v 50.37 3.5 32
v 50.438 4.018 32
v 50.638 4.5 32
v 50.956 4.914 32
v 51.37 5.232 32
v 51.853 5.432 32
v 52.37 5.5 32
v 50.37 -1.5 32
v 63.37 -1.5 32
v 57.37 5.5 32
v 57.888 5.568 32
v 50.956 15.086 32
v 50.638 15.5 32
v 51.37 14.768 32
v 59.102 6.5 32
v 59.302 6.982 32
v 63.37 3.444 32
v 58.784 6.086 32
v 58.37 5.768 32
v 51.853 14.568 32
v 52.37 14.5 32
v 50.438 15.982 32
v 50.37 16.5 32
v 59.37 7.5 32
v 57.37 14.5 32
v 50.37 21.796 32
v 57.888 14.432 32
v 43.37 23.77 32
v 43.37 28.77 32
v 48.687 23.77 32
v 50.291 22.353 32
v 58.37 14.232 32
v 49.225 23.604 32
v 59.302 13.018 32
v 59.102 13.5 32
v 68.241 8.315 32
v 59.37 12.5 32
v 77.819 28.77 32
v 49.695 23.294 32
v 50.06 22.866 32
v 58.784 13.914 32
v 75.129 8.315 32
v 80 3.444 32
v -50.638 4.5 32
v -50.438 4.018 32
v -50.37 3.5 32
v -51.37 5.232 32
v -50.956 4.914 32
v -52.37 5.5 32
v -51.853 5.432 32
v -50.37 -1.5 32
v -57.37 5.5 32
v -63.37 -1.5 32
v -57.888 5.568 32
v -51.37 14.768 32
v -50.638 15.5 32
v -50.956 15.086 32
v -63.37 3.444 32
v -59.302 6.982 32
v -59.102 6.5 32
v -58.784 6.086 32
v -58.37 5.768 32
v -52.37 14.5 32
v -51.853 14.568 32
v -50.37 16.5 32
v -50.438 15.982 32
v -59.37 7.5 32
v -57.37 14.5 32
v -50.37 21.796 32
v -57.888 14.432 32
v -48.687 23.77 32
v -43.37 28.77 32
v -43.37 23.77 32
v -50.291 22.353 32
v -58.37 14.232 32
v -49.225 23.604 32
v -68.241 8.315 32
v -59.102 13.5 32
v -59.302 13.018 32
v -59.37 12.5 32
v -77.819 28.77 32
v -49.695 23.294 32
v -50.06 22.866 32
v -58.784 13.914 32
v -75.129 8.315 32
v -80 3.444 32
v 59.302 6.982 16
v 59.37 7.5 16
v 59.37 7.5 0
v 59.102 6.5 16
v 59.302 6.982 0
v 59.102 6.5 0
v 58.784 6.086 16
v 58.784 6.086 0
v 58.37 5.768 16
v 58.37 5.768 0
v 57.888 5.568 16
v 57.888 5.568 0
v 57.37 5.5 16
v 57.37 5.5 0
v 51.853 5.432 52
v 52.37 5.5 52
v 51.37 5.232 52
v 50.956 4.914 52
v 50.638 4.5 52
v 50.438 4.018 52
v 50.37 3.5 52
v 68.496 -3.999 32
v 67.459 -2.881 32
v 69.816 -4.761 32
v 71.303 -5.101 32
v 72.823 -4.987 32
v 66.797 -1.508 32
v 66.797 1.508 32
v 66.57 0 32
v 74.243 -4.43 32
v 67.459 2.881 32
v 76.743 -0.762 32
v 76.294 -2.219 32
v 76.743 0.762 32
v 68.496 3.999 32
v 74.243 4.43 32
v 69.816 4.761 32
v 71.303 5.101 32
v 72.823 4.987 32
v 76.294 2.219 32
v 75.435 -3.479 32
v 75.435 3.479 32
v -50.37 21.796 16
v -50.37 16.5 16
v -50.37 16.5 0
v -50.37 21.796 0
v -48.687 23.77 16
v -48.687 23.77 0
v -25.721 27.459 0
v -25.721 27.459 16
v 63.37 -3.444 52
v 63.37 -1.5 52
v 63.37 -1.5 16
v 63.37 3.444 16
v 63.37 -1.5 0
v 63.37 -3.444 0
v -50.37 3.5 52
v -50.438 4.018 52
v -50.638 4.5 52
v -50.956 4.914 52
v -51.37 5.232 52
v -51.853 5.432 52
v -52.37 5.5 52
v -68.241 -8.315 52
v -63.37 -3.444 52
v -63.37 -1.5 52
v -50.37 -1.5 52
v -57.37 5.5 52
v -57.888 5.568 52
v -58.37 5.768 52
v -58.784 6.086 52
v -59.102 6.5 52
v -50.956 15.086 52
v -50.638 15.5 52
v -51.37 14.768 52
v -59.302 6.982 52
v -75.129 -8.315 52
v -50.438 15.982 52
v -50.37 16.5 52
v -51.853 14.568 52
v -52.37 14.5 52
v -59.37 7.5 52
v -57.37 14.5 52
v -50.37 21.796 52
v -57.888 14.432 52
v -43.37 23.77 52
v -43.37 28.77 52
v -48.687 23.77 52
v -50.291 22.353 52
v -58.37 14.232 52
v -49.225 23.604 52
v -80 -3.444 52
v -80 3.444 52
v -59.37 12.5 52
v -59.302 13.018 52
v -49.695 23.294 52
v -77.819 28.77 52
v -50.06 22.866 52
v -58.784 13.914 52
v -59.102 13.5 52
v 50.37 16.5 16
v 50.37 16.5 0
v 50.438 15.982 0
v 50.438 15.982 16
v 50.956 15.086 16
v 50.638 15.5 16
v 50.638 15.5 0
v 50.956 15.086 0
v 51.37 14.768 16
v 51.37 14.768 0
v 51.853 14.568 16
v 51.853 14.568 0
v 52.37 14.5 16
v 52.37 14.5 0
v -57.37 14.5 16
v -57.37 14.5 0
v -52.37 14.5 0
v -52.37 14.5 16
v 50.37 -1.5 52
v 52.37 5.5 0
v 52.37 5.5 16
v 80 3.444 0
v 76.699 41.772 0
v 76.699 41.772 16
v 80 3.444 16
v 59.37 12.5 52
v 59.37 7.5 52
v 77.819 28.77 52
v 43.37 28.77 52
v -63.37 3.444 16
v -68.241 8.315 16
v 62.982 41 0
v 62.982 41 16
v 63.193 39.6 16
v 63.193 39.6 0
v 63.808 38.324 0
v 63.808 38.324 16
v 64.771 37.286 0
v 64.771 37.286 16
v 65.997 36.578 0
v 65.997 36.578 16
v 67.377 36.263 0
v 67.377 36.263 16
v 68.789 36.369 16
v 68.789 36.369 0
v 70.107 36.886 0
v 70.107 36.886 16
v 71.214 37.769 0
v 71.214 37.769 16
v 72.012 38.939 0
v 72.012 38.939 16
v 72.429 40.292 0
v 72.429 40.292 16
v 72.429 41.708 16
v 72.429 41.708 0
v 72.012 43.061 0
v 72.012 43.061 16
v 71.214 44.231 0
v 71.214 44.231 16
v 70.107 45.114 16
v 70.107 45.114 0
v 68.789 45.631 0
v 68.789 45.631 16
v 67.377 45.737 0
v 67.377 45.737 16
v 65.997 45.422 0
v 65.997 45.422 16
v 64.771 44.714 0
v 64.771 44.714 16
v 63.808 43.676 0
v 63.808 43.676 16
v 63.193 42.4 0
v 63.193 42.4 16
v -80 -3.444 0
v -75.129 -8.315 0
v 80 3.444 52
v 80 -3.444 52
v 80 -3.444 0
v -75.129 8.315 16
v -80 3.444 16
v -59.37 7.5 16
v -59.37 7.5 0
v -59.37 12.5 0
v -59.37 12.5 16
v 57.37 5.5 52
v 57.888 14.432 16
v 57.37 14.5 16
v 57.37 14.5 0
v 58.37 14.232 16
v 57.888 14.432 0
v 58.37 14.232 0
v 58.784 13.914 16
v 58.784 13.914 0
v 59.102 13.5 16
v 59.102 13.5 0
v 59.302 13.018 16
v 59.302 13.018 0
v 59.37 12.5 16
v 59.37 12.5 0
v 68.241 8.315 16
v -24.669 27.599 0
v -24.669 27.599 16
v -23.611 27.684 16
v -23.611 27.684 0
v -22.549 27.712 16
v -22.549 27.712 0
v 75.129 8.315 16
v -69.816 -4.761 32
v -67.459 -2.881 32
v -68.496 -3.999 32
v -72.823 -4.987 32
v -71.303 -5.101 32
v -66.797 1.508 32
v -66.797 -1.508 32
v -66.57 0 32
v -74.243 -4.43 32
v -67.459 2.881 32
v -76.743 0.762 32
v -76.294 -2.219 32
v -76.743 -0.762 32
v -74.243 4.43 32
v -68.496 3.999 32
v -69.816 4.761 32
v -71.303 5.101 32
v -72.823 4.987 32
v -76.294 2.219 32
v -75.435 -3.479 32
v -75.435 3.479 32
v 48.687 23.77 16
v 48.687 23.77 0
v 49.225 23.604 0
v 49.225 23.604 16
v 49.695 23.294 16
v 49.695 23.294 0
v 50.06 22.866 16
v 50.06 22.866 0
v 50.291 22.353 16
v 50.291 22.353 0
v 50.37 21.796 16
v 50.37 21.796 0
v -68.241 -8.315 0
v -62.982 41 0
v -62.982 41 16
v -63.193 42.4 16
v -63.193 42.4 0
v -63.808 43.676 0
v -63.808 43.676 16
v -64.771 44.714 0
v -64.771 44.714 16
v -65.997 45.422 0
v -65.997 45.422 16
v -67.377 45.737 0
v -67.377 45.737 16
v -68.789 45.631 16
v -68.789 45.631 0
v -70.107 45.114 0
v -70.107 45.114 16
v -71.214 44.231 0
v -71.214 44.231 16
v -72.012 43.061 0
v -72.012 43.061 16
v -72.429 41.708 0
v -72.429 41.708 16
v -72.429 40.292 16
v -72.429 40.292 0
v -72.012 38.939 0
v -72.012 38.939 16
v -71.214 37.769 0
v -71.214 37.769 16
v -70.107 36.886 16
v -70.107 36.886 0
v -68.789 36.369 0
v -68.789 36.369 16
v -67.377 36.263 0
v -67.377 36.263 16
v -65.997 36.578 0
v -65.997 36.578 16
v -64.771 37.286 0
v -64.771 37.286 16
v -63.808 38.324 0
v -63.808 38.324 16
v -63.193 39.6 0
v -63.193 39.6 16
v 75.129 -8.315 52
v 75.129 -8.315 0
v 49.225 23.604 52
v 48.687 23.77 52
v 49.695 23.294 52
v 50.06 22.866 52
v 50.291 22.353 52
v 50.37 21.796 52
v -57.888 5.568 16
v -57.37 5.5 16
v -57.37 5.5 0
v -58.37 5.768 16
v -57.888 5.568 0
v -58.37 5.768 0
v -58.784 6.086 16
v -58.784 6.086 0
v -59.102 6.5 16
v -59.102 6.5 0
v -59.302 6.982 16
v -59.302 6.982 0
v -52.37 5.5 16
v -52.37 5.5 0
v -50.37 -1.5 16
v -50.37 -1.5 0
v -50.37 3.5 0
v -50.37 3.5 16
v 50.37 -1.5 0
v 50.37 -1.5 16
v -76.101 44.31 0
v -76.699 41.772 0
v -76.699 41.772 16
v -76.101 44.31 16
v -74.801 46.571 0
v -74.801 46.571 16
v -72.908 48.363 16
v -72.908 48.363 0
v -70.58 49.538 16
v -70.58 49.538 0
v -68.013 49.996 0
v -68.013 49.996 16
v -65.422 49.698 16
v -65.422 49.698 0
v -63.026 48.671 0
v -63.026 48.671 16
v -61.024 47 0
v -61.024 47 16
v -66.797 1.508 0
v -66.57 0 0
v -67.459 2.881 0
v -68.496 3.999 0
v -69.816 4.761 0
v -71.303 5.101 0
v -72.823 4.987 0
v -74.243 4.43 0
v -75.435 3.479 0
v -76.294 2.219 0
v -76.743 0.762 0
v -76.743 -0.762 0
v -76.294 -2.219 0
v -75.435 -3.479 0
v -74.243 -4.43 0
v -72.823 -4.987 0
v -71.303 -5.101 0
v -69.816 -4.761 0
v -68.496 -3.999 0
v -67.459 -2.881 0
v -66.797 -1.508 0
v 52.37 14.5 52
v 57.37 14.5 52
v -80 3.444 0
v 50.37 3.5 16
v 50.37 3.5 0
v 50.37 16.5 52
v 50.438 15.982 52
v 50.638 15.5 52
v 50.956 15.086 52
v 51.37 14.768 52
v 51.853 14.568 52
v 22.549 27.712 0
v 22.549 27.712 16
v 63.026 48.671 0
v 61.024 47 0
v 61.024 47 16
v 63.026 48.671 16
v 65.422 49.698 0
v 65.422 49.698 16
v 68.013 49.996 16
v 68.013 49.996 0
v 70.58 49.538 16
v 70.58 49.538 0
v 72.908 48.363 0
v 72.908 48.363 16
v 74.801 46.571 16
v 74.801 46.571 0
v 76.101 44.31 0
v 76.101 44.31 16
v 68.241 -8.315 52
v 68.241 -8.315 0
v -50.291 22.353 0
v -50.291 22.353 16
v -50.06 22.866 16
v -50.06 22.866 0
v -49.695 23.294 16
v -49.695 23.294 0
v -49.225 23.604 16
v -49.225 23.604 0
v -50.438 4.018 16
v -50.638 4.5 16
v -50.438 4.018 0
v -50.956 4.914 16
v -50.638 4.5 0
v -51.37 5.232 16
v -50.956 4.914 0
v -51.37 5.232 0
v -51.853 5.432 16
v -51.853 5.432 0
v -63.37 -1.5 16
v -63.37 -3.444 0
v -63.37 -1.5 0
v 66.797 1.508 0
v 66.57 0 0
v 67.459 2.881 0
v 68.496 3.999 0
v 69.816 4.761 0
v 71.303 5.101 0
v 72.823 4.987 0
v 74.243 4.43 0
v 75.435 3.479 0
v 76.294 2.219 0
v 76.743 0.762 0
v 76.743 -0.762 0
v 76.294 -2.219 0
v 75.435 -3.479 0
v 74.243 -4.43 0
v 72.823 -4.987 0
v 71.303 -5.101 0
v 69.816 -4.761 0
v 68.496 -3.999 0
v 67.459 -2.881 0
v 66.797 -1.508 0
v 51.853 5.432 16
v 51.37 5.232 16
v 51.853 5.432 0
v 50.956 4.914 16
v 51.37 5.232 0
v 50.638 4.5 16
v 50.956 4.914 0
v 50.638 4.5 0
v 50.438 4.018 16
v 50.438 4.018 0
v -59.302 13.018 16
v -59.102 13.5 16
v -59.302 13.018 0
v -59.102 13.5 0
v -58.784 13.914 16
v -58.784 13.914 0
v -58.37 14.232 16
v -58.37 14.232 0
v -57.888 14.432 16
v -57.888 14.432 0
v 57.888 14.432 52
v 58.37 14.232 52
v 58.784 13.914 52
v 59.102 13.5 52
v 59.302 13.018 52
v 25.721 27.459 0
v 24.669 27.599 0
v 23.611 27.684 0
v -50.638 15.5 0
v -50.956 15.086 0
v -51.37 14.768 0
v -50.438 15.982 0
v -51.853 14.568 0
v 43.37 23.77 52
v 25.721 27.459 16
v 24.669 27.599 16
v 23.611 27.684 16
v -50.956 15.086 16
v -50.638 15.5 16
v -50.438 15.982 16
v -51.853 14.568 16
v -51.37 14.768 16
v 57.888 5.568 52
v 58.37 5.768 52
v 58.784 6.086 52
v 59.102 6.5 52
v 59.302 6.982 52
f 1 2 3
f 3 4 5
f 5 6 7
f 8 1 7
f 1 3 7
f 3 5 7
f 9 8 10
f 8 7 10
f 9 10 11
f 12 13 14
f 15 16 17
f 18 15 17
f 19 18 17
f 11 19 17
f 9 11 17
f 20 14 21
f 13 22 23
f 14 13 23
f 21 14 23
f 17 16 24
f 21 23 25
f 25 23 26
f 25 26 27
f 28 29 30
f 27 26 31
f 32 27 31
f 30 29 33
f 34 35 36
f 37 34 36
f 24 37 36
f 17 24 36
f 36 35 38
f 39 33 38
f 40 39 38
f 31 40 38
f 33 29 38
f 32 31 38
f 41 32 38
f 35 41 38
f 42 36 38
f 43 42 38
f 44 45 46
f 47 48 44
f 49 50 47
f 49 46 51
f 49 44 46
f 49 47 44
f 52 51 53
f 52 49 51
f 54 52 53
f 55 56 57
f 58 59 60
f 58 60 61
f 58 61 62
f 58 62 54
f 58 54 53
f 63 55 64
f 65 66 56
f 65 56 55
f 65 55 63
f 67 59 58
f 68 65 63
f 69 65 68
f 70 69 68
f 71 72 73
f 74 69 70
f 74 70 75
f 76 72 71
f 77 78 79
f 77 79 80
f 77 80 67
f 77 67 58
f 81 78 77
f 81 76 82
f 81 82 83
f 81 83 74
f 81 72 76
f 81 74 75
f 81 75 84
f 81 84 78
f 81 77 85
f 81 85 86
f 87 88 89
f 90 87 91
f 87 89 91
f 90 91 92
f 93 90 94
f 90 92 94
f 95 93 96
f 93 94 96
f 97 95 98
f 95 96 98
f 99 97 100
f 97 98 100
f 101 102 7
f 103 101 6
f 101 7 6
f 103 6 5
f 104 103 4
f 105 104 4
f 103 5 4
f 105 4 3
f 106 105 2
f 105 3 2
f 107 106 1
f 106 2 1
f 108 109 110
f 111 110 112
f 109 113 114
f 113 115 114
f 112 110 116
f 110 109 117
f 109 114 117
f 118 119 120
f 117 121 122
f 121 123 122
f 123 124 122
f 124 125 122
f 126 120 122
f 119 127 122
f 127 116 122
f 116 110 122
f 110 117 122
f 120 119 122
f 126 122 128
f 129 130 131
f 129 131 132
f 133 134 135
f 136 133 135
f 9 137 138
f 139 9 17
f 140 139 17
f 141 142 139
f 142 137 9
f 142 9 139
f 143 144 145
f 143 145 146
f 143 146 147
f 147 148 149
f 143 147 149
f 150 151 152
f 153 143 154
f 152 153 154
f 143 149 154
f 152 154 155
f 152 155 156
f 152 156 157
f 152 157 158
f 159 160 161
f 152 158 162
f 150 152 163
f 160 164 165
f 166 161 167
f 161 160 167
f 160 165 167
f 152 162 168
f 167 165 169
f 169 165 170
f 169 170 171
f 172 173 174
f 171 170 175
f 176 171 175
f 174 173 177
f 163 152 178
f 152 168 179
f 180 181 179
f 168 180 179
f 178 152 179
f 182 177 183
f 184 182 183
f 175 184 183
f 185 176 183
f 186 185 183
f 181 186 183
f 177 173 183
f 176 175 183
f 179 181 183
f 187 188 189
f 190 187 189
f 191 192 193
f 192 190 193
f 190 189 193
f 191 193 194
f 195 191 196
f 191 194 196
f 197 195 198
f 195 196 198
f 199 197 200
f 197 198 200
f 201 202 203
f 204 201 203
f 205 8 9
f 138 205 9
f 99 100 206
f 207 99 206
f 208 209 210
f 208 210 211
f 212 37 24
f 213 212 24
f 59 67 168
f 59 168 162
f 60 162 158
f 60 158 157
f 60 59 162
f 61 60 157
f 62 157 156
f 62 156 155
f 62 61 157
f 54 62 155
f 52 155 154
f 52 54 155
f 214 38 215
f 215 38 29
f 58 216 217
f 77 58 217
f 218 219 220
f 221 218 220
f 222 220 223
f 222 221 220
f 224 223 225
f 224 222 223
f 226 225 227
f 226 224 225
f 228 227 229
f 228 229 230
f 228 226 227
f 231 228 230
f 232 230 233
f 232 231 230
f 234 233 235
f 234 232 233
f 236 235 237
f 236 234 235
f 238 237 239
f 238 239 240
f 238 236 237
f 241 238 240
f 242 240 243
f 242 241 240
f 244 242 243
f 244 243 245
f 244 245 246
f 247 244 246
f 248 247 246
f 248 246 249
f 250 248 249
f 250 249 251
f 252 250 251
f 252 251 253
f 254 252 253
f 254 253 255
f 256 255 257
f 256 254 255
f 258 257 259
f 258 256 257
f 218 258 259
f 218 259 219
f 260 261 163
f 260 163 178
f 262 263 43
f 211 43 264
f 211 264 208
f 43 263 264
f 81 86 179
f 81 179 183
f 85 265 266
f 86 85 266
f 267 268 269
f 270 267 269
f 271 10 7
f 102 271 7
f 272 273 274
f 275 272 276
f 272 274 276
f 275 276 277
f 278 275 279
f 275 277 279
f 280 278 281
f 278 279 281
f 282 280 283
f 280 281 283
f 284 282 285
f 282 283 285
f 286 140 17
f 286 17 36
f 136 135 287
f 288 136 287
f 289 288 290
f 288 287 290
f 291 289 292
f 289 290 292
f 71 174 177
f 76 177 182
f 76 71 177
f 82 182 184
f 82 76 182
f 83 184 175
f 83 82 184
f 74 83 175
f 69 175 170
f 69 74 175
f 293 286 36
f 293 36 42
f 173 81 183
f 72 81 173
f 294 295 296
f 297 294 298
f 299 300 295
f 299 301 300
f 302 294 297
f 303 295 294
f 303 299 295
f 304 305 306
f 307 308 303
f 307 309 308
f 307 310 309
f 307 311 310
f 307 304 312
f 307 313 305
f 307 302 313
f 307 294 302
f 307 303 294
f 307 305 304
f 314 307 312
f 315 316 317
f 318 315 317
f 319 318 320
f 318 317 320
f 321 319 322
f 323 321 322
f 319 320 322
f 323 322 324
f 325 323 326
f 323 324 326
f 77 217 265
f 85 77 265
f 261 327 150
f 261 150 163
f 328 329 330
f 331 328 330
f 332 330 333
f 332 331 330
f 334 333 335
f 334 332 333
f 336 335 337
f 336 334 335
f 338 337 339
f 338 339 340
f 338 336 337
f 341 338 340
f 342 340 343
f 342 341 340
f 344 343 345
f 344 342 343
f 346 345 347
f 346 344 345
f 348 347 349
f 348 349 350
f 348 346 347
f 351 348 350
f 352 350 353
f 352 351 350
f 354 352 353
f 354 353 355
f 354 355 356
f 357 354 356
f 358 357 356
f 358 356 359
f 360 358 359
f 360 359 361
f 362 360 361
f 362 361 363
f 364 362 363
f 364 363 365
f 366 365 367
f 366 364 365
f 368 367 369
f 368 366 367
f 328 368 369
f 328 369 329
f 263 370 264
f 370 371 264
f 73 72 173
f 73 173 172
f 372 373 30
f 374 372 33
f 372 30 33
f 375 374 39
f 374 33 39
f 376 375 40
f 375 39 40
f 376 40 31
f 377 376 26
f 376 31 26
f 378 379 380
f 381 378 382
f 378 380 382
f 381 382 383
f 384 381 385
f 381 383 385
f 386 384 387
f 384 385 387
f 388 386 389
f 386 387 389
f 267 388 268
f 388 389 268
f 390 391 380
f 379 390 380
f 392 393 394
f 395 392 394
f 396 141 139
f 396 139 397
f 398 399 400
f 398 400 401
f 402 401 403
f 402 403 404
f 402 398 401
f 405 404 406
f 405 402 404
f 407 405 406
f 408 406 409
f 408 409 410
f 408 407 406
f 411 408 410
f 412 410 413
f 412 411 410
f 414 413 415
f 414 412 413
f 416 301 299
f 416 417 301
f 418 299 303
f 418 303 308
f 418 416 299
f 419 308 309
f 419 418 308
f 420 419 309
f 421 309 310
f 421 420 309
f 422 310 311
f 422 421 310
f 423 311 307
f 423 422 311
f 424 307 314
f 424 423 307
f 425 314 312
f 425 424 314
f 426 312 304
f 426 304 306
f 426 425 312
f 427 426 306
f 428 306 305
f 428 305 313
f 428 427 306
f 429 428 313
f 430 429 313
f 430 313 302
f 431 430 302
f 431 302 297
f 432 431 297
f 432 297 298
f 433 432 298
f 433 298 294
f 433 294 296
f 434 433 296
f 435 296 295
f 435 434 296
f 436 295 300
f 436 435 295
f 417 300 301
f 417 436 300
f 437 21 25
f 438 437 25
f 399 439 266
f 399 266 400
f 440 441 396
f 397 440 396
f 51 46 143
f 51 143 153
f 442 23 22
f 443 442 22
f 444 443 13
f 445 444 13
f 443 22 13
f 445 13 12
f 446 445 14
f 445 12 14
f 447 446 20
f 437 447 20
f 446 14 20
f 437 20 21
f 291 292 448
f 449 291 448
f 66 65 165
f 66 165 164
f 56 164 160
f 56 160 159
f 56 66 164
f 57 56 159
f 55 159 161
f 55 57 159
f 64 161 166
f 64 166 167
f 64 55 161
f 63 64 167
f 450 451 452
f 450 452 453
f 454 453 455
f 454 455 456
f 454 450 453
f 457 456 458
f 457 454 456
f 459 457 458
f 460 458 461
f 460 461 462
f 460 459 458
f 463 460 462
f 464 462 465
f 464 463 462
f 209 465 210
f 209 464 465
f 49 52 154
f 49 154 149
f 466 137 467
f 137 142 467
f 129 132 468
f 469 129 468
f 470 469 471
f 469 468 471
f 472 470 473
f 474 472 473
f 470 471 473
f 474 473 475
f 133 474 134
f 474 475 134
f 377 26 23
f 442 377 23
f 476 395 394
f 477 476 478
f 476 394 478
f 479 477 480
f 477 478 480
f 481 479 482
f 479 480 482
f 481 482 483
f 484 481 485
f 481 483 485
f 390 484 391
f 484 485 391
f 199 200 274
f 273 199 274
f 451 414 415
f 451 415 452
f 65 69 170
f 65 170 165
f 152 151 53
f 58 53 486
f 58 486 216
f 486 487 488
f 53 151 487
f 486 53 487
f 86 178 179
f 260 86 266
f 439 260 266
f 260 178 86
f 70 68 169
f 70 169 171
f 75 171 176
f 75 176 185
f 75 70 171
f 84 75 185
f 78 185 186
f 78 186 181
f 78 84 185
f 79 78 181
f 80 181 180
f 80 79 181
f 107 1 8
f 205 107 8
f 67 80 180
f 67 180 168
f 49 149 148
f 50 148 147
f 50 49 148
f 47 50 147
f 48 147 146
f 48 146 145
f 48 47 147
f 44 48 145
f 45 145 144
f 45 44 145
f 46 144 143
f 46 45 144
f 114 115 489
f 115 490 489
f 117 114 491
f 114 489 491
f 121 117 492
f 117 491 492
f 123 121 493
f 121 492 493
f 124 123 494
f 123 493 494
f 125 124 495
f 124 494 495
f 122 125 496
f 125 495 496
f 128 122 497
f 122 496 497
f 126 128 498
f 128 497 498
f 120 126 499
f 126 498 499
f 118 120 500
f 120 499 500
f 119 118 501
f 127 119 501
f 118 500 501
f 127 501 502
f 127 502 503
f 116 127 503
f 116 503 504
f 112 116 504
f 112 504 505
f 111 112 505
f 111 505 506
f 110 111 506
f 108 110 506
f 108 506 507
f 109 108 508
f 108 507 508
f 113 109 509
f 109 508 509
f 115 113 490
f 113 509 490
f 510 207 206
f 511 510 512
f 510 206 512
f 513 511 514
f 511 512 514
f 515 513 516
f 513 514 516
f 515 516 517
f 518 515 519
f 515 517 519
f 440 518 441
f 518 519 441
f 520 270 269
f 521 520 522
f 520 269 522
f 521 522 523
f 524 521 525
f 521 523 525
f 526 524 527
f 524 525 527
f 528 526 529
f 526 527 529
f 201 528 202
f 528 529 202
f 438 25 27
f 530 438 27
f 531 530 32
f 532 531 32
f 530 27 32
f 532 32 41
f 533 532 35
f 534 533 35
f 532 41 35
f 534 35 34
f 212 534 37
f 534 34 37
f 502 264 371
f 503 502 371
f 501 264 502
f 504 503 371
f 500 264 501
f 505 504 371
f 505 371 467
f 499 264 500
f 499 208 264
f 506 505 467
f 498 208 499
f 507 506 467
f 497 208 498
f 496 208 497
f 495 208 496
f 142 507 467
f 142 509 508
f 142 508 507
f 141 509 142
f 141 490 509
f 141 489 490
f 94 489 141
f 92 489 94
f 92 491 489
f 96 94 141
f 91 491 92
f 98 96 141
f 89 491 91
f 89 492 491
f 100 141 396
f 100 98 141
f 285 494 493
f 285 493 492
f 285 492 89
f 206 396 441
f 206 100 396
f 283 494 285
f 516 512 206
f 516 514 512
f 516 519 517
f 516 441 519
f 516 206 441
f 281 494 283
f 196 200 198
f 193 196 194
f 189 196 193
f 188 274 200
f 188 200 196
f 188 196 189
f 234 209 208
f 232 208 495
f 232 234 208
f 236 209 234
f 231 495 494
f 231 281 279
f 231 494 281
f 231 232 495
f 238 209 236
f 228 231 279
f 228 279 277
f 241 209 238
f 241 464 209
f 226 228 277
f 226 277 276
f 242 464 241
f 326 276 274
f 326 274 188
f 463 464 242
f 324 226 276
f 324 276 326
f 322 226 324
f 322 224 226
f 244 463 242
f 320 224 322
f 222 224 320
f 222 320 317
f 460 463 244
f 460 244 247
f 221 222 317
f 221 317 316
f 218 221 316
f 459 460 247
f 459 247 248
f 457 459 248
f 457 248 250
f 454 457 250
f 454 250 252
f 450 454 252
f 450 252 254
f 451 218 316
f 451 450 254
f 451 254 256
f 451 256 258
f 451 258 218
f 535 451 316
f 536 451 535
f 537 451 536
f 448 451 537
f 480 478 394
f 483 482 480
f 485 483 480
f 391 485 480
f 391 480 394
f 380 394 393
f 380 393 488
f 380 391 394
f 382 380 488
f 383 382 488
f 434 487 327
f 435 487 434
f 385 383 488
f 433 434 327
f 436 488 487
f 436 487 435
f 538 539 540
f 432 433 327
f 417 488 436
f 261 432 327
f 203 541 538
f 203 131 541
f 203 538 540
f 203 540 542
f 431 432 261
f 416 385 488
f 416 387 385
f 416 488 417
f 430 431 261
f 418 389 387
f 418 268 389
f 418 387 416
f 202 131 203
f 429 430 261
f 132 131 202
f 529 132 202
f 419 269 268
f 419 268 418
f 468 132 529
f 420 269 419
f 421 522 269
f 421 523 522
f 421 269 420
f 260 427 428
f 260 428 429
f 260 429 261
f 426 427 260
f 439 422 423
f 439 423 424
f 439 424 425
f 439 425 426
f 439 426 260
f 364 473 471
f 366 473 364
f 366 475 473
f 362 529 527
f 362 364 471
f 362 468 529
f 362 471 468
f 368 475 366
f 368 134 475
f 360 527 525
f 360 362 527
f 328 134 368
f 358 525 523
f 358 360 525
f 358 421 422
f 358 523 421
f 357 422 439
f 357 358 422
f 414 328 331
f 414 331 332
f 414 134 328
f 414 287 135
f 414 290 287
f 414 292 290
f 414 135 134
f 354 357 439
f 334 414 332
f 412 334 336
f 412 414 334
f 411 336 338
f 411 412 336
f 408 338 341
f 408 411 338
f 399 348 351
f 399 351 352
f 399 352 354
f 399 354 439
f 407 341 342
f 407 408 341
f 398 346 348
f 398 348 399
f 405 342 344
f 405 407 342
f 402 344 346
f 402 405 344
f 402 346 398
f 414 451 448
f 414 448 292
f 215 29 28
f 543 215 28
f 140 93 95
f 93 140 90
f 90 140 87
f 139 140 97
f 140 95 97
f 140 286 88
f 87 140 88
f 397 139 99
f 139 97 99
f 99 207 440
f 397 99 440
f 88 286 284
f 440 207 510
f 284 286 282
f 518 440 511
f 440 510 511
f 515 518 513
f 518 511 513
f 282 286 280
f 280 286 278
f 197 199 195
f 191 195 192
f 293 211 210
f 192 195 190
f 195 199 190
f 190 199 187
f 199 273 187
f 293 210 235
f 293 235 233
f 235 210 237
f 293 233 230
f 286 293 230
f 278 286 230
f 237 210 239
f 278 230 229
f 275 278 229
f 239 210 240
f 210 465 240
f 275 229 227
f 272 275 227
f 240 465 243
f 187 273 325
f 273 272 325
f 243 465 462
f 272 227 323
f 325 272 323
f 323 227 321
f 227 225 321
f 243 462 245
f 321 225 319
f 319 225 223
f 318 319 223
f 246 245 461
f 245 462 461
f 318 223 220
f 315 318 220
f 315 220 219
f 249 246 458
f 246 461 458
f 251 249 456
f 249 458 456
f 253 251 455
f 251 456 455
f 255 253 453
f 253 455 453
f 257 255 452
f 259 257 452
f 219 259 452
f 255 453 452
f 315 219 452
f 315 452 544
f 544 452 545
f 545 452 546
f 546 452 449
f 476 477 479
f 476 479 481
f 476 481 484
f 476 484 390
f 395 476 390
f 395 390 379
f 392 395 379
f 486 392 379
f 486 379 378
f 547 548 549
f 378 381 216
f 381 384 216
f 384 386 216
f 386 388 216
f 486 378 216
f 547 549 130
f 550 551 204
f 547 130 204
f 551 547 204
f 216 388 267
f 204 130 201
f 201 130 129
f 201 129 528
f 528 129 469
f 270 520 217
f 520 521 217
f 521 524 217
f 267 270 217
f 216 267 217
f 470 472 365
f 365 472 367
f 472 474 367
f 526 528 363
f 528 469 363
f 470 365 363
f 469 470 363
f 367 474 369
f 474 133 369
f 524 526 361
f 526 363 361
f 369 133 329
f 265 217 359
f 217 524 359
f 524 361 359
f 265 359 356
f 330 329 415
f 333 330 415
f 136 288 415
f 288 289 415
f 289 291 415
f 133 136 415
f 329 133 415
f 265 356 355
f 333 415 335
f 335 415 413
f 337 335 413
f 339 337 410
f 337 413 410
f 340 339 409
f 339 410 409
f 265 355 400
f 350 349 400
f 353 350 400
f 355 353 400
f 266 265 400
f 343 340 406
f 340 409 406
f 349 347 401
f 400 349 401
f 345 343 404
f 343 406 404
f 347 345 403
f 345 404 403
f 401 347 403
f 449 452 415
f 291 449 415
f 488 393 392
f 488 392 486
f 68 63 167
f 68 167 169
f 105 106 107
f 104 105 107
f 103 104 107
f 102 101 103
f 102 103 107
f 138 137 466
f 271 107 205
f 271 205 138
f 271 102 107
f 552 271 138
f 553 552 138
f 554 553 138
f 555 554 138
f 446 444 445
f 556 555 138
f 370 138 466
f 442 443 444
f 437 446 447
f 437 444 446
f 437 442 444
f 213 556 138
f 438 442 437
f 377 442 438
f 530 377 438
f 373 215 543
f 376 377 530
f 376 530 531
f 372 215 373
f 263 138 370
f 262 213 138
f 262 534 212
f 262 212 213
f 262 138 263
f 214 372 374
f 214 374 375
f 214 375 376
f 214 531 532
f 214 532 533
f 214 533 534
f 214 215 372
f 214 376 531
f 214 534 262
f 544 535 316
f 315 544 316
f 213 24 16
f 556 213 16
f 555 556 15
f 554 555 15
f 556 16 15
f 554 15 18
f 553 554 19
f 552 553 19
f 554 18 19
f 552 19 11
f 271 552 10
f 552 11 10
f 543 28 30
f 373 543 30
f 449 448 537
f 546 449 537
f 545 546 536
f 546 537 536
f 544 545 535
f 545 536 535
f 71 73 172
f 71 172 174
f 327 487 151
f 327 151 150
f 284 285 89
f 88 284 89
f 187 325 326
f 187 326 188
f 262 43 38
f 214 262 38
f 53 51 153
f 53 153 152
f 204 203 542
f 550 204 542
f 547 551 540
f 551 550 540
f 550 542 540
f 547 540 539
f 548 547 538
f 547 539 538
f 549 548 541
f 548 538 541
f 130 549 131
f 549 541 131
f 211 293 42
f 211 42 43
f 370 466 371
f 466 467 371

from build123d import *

# Parameters (mm, degrees)
SKETCH1_R           = 5.115
SKETCH1_R_2         = 4.75
BOSS_EXTRUDE1_DEPTH = 16
CUT_EXTRUDE1_DEPTH  = 96.686989711
SKETCH3_R           = 5.115
BOSS_EXTRUDE2_DEPTH = 16
BOSS_EXTRUDE3_DEPTH = 20


with BuildPart() as part:
    # Sketch1 → Boss-Extrude1 (new body)
    with BuildSketch(Plane.XY):
        with BuildLine():
            Line((-80, 3.444150891), (-76.699065455, 41.772249209))
            ThreePointArc((-76.699065455, 41.772249209), (-70.579654753, 49.5377007), (-61.024054334, 47))
            Line((-61.024054334, 47), (61.024054334, 47))
            ThreePointArc((61.024054334, 47), (70.579654753, 49.5377007), (76.699065455, 41.772249209))
            Line((76.699065455, 41.772249209), (80, 3.444150891))
            Line((80, 3.444150891), (80, -3.444150891))
            Line((80, -3.444150891), (75.129235099, -8.314915793))
            Line((75.129235099, -8.314915793), (68.240933316, -8.314915793))
            Line((68.240933316, -8.314915793), (63.370168415, -3.444150891))
            Line((63.370168415, -3.444150891), (63.370168415, -1.5))
            Line((63.370168415, -1.5), (-63.370168415, -1.5))
            Line((-63.370168415, -1.5), (-63.370168415, -3.444150891))
            Line((-63.370168415, -3.444150891), (-68.240933316, -8.314915793))
            Line((-68.240933316, -8.314915793), (-75.129235099, -8.314915793))
            Line((-75.129235099, -8.314915793), (-80, -3.444150891))
            Line((-80, -3.444150891), (-80, 3.444150891))
        make_face()
        with Locations((-71.685084207, 0)):
            Circle(SKETCH1_R, mode=Mode.SUBTRACT)
        with Locations((-67.732258267, 41)):
            Circle(SKETCH1_R_2, mode=Mode.SUBTRACT)
        with Locations(Location((67.732258267, 41, 0), (0, 0, 180))):
            Circle(SKETCH1_R_2, mode=Mode.SUBTRACT)
        with Locations(Location((71.685084207, 0, 0), (0, 0, 180))):
            Circle(SKETCH1_R, mode=Mode.SUBTRACT)
    extrude(amount=BOSS_EXTRUDE1_DEPTH)

    # Sketch2 → Cut-Extrude1 (cut, through all)
    with BuildSketch(Plane(origin=(0, 0, 0), x_dir=(-1, 0, 0), z_dir=(0, 0, -1))):
        with BuildLine():
            Line((-50.370168415, 3.5), (-50.370168415, -2.5))
            Line((-50.370168415, -2.5), (50.370168415, -2.5))
            Line((50.370168415, -2.5), (50.370168415, 3.5))
            ThreePointArc((50.370168415, 3.5), (50.955954852, 4.914213562), (52.370168415, 5.5))
            Line((52.370168415, 5.5), (57.370168415, 5.5))
            ThreePointArc((57.370168415, 5.5), (58.784381977, 6.085786438), (59.370168415, 7.5))
            Line((59.370168415, 7.5), (59.370168415, 12.5))
            ThreePointArc((59.370168415, 12.5), (58.784381977, 13.914213562), (57.370168415, 14.5))
            Line((57.370168415, 14.5), (52.370168415, 14.5))
            ThreePointArc((52.370168415, 14.5), (50.955954852, 15.085786438), (50.370168415, 16.5))
            Line((50.370168415, 16.5), (50.370168415, 21.795575149))
            ThreePointArc((50.370168415, 21.795575149), (49.892383898, 23.092826098), (48.687308391, 23.770270629))
            Line((48.687308391, 23.770270629), (25.72087261, 27.45872537))
            ThreePointArc((25.72087261, 27.45872537), (24.140212323, 27.648408909), (22.549472845, 27.711770579))
            Line((22.549472845, 27.711770579), (-22.549472845, 27.711770579))
            ThreePointArc((-22.549472845, 27.711770579), (-24.140212323, 27.648408909), (-25.72087261, 27.45872537))
            Line((-25.72087261, 27.45872537), (-48.687308391, 23.770270629))
            ThreePointArc((-48.687308391, 23.770270629), (-49.892383898, 23.092826098), (-50.370168415, 21.795575149))
            Line((-50.370168415, 21.795575149), (-50.370168415, 16.5))
            ThreePointArc((-50.370168415, 16.5), (-50.955954852, 15.085786438), (-52.370168415, 14.5))
            Line((-52.370168415, 14.5), (-57.370168415, 14.5))
            ThreePointArc((-57.370168415, 14.5), (-58.784381977, 13.914213562), (-59.370168415, 12.5))
            Line((-59.370168415, 12.5), (-59.370168415, 7.5))
            ThreePointArc((-59.370168415, 7.5), (-58.784381977, 6.085786438), (-57.370168415, 5.5))
            Line((-57.370168415, 5.5), (-52.370168415, 5.5))
            ThreePointArc((-52.370168415, 5.5), (-50.955954852, 4.914213562), (-50.370168415, 3.5))
        make_face()
    extrude(amount=-CUT_EXTRUDE1_DEPTH, mode=Mode.SUBTRACT)

    # Sketch3 → Boss-Extrude2 (add)
    with BuildSketch(Plane.XY.offset(16)):
        Polygon((-80, 3.444150891), (-80, -3.444150891), (-75.129235099, -8.314915793), (-68.240933316, -8.314915793), (-63.370168415, -3.444150891), (-63.370168415, 3.444150891), (-68.240933316, 8.314915793), (-75.129235099, 8.314915793), align=None)
        with Locations((-71.685084207, 0)):
            Circle(SKETCH3_R, mode=Mode.SUBTRACT)
    boss_extrude2 = extrude(amount=BOSS_EXTRUDE2_DEPTH)

    # Mirror1: Boss-Extrude2 across plane
    add(boss_extrude2.mirror(Plane(origin=(0, 0, 0), x_dir=(0, 0, 1), z_dir=(1, 0, 0))))

    # Sketch4 → Boss-Extrude3 (add)
    with BuildSketch(Plane.XY.offset(32)):
        with BuildLine():
            Line((-77.818836123, 28.770270629), (-43.370168415, 28.770270629))
            Line((-43.370168415, 28.770270629), (-43.370168415, 23.770270629))
            Line((-43.370168415, 23.770270629), (-48.687308391, 23.770270629))
            ThreePointArc((-48.687308391, 23.770270629), (-49.892383898, 23.092826098), (-50.370168415, 21.795575149))
            Line((-50.370168415, 21.795575149), (-50.370168415, 16.5))
            ThreePointArc((-50.370168415, 16.5), (-50.955954852, 15.085786438), (-52.370168415, 14.5))
            Line((-52.370168415, 14.5), (-57.370168415, 14.5))
            ThreePointArc((-57.370168415, 14.5), (-58.784381977, 13.914213562), (-59.370168415, 12.5))
            Line((-59.370168415, 12.5), (-59.370168415, 7.5))
            ThreePointArc((-59.370168415, 7.5), (-58.784381977, 6.085786438), (-57.370168415, 5.5))
            Line((-57.370168415, 5.5), (-52.370168415, 5.5))
            ThreePointArc((-52.370168415, 5.5), (-50.955954852, 4.914213562), (-50.370168415, 3.5))
            Line((-50.370168415, 3.5), (-50.370168415, -1.5))
            Line((-50.370168415, -1.5), (-63.370168415, -1.5))
            Line((-63.370168415, -1.5), (-63.370168415, -3.444150891))
            Line((-63.370168415, -3.444150891), (-68.240933316, -8.314915793))
            Line((-68.240933316, -8.314915793), (-75.129235099, -8.314915793))
            Line((-75.129235099, -8.314915793), (-80, -3.444150891))
            Line((-80, -3.444150891), (-80, 3.444150891))
            Line((-80, 3.444150891), (-77.818836123, 28.770270629))
        make_face()
    boss_extrude3 = extrude(amount=BOSS_EXTRUDE3_DEPTH)

    # Mirror2: Boss-Extrude3 across plane
    add(boss_extrude3.mirror(Plane(origin=(0, 0, 0), x_dir=(0, 0, 1), z_dir=(1, 0, 0))))


solid = part.part
